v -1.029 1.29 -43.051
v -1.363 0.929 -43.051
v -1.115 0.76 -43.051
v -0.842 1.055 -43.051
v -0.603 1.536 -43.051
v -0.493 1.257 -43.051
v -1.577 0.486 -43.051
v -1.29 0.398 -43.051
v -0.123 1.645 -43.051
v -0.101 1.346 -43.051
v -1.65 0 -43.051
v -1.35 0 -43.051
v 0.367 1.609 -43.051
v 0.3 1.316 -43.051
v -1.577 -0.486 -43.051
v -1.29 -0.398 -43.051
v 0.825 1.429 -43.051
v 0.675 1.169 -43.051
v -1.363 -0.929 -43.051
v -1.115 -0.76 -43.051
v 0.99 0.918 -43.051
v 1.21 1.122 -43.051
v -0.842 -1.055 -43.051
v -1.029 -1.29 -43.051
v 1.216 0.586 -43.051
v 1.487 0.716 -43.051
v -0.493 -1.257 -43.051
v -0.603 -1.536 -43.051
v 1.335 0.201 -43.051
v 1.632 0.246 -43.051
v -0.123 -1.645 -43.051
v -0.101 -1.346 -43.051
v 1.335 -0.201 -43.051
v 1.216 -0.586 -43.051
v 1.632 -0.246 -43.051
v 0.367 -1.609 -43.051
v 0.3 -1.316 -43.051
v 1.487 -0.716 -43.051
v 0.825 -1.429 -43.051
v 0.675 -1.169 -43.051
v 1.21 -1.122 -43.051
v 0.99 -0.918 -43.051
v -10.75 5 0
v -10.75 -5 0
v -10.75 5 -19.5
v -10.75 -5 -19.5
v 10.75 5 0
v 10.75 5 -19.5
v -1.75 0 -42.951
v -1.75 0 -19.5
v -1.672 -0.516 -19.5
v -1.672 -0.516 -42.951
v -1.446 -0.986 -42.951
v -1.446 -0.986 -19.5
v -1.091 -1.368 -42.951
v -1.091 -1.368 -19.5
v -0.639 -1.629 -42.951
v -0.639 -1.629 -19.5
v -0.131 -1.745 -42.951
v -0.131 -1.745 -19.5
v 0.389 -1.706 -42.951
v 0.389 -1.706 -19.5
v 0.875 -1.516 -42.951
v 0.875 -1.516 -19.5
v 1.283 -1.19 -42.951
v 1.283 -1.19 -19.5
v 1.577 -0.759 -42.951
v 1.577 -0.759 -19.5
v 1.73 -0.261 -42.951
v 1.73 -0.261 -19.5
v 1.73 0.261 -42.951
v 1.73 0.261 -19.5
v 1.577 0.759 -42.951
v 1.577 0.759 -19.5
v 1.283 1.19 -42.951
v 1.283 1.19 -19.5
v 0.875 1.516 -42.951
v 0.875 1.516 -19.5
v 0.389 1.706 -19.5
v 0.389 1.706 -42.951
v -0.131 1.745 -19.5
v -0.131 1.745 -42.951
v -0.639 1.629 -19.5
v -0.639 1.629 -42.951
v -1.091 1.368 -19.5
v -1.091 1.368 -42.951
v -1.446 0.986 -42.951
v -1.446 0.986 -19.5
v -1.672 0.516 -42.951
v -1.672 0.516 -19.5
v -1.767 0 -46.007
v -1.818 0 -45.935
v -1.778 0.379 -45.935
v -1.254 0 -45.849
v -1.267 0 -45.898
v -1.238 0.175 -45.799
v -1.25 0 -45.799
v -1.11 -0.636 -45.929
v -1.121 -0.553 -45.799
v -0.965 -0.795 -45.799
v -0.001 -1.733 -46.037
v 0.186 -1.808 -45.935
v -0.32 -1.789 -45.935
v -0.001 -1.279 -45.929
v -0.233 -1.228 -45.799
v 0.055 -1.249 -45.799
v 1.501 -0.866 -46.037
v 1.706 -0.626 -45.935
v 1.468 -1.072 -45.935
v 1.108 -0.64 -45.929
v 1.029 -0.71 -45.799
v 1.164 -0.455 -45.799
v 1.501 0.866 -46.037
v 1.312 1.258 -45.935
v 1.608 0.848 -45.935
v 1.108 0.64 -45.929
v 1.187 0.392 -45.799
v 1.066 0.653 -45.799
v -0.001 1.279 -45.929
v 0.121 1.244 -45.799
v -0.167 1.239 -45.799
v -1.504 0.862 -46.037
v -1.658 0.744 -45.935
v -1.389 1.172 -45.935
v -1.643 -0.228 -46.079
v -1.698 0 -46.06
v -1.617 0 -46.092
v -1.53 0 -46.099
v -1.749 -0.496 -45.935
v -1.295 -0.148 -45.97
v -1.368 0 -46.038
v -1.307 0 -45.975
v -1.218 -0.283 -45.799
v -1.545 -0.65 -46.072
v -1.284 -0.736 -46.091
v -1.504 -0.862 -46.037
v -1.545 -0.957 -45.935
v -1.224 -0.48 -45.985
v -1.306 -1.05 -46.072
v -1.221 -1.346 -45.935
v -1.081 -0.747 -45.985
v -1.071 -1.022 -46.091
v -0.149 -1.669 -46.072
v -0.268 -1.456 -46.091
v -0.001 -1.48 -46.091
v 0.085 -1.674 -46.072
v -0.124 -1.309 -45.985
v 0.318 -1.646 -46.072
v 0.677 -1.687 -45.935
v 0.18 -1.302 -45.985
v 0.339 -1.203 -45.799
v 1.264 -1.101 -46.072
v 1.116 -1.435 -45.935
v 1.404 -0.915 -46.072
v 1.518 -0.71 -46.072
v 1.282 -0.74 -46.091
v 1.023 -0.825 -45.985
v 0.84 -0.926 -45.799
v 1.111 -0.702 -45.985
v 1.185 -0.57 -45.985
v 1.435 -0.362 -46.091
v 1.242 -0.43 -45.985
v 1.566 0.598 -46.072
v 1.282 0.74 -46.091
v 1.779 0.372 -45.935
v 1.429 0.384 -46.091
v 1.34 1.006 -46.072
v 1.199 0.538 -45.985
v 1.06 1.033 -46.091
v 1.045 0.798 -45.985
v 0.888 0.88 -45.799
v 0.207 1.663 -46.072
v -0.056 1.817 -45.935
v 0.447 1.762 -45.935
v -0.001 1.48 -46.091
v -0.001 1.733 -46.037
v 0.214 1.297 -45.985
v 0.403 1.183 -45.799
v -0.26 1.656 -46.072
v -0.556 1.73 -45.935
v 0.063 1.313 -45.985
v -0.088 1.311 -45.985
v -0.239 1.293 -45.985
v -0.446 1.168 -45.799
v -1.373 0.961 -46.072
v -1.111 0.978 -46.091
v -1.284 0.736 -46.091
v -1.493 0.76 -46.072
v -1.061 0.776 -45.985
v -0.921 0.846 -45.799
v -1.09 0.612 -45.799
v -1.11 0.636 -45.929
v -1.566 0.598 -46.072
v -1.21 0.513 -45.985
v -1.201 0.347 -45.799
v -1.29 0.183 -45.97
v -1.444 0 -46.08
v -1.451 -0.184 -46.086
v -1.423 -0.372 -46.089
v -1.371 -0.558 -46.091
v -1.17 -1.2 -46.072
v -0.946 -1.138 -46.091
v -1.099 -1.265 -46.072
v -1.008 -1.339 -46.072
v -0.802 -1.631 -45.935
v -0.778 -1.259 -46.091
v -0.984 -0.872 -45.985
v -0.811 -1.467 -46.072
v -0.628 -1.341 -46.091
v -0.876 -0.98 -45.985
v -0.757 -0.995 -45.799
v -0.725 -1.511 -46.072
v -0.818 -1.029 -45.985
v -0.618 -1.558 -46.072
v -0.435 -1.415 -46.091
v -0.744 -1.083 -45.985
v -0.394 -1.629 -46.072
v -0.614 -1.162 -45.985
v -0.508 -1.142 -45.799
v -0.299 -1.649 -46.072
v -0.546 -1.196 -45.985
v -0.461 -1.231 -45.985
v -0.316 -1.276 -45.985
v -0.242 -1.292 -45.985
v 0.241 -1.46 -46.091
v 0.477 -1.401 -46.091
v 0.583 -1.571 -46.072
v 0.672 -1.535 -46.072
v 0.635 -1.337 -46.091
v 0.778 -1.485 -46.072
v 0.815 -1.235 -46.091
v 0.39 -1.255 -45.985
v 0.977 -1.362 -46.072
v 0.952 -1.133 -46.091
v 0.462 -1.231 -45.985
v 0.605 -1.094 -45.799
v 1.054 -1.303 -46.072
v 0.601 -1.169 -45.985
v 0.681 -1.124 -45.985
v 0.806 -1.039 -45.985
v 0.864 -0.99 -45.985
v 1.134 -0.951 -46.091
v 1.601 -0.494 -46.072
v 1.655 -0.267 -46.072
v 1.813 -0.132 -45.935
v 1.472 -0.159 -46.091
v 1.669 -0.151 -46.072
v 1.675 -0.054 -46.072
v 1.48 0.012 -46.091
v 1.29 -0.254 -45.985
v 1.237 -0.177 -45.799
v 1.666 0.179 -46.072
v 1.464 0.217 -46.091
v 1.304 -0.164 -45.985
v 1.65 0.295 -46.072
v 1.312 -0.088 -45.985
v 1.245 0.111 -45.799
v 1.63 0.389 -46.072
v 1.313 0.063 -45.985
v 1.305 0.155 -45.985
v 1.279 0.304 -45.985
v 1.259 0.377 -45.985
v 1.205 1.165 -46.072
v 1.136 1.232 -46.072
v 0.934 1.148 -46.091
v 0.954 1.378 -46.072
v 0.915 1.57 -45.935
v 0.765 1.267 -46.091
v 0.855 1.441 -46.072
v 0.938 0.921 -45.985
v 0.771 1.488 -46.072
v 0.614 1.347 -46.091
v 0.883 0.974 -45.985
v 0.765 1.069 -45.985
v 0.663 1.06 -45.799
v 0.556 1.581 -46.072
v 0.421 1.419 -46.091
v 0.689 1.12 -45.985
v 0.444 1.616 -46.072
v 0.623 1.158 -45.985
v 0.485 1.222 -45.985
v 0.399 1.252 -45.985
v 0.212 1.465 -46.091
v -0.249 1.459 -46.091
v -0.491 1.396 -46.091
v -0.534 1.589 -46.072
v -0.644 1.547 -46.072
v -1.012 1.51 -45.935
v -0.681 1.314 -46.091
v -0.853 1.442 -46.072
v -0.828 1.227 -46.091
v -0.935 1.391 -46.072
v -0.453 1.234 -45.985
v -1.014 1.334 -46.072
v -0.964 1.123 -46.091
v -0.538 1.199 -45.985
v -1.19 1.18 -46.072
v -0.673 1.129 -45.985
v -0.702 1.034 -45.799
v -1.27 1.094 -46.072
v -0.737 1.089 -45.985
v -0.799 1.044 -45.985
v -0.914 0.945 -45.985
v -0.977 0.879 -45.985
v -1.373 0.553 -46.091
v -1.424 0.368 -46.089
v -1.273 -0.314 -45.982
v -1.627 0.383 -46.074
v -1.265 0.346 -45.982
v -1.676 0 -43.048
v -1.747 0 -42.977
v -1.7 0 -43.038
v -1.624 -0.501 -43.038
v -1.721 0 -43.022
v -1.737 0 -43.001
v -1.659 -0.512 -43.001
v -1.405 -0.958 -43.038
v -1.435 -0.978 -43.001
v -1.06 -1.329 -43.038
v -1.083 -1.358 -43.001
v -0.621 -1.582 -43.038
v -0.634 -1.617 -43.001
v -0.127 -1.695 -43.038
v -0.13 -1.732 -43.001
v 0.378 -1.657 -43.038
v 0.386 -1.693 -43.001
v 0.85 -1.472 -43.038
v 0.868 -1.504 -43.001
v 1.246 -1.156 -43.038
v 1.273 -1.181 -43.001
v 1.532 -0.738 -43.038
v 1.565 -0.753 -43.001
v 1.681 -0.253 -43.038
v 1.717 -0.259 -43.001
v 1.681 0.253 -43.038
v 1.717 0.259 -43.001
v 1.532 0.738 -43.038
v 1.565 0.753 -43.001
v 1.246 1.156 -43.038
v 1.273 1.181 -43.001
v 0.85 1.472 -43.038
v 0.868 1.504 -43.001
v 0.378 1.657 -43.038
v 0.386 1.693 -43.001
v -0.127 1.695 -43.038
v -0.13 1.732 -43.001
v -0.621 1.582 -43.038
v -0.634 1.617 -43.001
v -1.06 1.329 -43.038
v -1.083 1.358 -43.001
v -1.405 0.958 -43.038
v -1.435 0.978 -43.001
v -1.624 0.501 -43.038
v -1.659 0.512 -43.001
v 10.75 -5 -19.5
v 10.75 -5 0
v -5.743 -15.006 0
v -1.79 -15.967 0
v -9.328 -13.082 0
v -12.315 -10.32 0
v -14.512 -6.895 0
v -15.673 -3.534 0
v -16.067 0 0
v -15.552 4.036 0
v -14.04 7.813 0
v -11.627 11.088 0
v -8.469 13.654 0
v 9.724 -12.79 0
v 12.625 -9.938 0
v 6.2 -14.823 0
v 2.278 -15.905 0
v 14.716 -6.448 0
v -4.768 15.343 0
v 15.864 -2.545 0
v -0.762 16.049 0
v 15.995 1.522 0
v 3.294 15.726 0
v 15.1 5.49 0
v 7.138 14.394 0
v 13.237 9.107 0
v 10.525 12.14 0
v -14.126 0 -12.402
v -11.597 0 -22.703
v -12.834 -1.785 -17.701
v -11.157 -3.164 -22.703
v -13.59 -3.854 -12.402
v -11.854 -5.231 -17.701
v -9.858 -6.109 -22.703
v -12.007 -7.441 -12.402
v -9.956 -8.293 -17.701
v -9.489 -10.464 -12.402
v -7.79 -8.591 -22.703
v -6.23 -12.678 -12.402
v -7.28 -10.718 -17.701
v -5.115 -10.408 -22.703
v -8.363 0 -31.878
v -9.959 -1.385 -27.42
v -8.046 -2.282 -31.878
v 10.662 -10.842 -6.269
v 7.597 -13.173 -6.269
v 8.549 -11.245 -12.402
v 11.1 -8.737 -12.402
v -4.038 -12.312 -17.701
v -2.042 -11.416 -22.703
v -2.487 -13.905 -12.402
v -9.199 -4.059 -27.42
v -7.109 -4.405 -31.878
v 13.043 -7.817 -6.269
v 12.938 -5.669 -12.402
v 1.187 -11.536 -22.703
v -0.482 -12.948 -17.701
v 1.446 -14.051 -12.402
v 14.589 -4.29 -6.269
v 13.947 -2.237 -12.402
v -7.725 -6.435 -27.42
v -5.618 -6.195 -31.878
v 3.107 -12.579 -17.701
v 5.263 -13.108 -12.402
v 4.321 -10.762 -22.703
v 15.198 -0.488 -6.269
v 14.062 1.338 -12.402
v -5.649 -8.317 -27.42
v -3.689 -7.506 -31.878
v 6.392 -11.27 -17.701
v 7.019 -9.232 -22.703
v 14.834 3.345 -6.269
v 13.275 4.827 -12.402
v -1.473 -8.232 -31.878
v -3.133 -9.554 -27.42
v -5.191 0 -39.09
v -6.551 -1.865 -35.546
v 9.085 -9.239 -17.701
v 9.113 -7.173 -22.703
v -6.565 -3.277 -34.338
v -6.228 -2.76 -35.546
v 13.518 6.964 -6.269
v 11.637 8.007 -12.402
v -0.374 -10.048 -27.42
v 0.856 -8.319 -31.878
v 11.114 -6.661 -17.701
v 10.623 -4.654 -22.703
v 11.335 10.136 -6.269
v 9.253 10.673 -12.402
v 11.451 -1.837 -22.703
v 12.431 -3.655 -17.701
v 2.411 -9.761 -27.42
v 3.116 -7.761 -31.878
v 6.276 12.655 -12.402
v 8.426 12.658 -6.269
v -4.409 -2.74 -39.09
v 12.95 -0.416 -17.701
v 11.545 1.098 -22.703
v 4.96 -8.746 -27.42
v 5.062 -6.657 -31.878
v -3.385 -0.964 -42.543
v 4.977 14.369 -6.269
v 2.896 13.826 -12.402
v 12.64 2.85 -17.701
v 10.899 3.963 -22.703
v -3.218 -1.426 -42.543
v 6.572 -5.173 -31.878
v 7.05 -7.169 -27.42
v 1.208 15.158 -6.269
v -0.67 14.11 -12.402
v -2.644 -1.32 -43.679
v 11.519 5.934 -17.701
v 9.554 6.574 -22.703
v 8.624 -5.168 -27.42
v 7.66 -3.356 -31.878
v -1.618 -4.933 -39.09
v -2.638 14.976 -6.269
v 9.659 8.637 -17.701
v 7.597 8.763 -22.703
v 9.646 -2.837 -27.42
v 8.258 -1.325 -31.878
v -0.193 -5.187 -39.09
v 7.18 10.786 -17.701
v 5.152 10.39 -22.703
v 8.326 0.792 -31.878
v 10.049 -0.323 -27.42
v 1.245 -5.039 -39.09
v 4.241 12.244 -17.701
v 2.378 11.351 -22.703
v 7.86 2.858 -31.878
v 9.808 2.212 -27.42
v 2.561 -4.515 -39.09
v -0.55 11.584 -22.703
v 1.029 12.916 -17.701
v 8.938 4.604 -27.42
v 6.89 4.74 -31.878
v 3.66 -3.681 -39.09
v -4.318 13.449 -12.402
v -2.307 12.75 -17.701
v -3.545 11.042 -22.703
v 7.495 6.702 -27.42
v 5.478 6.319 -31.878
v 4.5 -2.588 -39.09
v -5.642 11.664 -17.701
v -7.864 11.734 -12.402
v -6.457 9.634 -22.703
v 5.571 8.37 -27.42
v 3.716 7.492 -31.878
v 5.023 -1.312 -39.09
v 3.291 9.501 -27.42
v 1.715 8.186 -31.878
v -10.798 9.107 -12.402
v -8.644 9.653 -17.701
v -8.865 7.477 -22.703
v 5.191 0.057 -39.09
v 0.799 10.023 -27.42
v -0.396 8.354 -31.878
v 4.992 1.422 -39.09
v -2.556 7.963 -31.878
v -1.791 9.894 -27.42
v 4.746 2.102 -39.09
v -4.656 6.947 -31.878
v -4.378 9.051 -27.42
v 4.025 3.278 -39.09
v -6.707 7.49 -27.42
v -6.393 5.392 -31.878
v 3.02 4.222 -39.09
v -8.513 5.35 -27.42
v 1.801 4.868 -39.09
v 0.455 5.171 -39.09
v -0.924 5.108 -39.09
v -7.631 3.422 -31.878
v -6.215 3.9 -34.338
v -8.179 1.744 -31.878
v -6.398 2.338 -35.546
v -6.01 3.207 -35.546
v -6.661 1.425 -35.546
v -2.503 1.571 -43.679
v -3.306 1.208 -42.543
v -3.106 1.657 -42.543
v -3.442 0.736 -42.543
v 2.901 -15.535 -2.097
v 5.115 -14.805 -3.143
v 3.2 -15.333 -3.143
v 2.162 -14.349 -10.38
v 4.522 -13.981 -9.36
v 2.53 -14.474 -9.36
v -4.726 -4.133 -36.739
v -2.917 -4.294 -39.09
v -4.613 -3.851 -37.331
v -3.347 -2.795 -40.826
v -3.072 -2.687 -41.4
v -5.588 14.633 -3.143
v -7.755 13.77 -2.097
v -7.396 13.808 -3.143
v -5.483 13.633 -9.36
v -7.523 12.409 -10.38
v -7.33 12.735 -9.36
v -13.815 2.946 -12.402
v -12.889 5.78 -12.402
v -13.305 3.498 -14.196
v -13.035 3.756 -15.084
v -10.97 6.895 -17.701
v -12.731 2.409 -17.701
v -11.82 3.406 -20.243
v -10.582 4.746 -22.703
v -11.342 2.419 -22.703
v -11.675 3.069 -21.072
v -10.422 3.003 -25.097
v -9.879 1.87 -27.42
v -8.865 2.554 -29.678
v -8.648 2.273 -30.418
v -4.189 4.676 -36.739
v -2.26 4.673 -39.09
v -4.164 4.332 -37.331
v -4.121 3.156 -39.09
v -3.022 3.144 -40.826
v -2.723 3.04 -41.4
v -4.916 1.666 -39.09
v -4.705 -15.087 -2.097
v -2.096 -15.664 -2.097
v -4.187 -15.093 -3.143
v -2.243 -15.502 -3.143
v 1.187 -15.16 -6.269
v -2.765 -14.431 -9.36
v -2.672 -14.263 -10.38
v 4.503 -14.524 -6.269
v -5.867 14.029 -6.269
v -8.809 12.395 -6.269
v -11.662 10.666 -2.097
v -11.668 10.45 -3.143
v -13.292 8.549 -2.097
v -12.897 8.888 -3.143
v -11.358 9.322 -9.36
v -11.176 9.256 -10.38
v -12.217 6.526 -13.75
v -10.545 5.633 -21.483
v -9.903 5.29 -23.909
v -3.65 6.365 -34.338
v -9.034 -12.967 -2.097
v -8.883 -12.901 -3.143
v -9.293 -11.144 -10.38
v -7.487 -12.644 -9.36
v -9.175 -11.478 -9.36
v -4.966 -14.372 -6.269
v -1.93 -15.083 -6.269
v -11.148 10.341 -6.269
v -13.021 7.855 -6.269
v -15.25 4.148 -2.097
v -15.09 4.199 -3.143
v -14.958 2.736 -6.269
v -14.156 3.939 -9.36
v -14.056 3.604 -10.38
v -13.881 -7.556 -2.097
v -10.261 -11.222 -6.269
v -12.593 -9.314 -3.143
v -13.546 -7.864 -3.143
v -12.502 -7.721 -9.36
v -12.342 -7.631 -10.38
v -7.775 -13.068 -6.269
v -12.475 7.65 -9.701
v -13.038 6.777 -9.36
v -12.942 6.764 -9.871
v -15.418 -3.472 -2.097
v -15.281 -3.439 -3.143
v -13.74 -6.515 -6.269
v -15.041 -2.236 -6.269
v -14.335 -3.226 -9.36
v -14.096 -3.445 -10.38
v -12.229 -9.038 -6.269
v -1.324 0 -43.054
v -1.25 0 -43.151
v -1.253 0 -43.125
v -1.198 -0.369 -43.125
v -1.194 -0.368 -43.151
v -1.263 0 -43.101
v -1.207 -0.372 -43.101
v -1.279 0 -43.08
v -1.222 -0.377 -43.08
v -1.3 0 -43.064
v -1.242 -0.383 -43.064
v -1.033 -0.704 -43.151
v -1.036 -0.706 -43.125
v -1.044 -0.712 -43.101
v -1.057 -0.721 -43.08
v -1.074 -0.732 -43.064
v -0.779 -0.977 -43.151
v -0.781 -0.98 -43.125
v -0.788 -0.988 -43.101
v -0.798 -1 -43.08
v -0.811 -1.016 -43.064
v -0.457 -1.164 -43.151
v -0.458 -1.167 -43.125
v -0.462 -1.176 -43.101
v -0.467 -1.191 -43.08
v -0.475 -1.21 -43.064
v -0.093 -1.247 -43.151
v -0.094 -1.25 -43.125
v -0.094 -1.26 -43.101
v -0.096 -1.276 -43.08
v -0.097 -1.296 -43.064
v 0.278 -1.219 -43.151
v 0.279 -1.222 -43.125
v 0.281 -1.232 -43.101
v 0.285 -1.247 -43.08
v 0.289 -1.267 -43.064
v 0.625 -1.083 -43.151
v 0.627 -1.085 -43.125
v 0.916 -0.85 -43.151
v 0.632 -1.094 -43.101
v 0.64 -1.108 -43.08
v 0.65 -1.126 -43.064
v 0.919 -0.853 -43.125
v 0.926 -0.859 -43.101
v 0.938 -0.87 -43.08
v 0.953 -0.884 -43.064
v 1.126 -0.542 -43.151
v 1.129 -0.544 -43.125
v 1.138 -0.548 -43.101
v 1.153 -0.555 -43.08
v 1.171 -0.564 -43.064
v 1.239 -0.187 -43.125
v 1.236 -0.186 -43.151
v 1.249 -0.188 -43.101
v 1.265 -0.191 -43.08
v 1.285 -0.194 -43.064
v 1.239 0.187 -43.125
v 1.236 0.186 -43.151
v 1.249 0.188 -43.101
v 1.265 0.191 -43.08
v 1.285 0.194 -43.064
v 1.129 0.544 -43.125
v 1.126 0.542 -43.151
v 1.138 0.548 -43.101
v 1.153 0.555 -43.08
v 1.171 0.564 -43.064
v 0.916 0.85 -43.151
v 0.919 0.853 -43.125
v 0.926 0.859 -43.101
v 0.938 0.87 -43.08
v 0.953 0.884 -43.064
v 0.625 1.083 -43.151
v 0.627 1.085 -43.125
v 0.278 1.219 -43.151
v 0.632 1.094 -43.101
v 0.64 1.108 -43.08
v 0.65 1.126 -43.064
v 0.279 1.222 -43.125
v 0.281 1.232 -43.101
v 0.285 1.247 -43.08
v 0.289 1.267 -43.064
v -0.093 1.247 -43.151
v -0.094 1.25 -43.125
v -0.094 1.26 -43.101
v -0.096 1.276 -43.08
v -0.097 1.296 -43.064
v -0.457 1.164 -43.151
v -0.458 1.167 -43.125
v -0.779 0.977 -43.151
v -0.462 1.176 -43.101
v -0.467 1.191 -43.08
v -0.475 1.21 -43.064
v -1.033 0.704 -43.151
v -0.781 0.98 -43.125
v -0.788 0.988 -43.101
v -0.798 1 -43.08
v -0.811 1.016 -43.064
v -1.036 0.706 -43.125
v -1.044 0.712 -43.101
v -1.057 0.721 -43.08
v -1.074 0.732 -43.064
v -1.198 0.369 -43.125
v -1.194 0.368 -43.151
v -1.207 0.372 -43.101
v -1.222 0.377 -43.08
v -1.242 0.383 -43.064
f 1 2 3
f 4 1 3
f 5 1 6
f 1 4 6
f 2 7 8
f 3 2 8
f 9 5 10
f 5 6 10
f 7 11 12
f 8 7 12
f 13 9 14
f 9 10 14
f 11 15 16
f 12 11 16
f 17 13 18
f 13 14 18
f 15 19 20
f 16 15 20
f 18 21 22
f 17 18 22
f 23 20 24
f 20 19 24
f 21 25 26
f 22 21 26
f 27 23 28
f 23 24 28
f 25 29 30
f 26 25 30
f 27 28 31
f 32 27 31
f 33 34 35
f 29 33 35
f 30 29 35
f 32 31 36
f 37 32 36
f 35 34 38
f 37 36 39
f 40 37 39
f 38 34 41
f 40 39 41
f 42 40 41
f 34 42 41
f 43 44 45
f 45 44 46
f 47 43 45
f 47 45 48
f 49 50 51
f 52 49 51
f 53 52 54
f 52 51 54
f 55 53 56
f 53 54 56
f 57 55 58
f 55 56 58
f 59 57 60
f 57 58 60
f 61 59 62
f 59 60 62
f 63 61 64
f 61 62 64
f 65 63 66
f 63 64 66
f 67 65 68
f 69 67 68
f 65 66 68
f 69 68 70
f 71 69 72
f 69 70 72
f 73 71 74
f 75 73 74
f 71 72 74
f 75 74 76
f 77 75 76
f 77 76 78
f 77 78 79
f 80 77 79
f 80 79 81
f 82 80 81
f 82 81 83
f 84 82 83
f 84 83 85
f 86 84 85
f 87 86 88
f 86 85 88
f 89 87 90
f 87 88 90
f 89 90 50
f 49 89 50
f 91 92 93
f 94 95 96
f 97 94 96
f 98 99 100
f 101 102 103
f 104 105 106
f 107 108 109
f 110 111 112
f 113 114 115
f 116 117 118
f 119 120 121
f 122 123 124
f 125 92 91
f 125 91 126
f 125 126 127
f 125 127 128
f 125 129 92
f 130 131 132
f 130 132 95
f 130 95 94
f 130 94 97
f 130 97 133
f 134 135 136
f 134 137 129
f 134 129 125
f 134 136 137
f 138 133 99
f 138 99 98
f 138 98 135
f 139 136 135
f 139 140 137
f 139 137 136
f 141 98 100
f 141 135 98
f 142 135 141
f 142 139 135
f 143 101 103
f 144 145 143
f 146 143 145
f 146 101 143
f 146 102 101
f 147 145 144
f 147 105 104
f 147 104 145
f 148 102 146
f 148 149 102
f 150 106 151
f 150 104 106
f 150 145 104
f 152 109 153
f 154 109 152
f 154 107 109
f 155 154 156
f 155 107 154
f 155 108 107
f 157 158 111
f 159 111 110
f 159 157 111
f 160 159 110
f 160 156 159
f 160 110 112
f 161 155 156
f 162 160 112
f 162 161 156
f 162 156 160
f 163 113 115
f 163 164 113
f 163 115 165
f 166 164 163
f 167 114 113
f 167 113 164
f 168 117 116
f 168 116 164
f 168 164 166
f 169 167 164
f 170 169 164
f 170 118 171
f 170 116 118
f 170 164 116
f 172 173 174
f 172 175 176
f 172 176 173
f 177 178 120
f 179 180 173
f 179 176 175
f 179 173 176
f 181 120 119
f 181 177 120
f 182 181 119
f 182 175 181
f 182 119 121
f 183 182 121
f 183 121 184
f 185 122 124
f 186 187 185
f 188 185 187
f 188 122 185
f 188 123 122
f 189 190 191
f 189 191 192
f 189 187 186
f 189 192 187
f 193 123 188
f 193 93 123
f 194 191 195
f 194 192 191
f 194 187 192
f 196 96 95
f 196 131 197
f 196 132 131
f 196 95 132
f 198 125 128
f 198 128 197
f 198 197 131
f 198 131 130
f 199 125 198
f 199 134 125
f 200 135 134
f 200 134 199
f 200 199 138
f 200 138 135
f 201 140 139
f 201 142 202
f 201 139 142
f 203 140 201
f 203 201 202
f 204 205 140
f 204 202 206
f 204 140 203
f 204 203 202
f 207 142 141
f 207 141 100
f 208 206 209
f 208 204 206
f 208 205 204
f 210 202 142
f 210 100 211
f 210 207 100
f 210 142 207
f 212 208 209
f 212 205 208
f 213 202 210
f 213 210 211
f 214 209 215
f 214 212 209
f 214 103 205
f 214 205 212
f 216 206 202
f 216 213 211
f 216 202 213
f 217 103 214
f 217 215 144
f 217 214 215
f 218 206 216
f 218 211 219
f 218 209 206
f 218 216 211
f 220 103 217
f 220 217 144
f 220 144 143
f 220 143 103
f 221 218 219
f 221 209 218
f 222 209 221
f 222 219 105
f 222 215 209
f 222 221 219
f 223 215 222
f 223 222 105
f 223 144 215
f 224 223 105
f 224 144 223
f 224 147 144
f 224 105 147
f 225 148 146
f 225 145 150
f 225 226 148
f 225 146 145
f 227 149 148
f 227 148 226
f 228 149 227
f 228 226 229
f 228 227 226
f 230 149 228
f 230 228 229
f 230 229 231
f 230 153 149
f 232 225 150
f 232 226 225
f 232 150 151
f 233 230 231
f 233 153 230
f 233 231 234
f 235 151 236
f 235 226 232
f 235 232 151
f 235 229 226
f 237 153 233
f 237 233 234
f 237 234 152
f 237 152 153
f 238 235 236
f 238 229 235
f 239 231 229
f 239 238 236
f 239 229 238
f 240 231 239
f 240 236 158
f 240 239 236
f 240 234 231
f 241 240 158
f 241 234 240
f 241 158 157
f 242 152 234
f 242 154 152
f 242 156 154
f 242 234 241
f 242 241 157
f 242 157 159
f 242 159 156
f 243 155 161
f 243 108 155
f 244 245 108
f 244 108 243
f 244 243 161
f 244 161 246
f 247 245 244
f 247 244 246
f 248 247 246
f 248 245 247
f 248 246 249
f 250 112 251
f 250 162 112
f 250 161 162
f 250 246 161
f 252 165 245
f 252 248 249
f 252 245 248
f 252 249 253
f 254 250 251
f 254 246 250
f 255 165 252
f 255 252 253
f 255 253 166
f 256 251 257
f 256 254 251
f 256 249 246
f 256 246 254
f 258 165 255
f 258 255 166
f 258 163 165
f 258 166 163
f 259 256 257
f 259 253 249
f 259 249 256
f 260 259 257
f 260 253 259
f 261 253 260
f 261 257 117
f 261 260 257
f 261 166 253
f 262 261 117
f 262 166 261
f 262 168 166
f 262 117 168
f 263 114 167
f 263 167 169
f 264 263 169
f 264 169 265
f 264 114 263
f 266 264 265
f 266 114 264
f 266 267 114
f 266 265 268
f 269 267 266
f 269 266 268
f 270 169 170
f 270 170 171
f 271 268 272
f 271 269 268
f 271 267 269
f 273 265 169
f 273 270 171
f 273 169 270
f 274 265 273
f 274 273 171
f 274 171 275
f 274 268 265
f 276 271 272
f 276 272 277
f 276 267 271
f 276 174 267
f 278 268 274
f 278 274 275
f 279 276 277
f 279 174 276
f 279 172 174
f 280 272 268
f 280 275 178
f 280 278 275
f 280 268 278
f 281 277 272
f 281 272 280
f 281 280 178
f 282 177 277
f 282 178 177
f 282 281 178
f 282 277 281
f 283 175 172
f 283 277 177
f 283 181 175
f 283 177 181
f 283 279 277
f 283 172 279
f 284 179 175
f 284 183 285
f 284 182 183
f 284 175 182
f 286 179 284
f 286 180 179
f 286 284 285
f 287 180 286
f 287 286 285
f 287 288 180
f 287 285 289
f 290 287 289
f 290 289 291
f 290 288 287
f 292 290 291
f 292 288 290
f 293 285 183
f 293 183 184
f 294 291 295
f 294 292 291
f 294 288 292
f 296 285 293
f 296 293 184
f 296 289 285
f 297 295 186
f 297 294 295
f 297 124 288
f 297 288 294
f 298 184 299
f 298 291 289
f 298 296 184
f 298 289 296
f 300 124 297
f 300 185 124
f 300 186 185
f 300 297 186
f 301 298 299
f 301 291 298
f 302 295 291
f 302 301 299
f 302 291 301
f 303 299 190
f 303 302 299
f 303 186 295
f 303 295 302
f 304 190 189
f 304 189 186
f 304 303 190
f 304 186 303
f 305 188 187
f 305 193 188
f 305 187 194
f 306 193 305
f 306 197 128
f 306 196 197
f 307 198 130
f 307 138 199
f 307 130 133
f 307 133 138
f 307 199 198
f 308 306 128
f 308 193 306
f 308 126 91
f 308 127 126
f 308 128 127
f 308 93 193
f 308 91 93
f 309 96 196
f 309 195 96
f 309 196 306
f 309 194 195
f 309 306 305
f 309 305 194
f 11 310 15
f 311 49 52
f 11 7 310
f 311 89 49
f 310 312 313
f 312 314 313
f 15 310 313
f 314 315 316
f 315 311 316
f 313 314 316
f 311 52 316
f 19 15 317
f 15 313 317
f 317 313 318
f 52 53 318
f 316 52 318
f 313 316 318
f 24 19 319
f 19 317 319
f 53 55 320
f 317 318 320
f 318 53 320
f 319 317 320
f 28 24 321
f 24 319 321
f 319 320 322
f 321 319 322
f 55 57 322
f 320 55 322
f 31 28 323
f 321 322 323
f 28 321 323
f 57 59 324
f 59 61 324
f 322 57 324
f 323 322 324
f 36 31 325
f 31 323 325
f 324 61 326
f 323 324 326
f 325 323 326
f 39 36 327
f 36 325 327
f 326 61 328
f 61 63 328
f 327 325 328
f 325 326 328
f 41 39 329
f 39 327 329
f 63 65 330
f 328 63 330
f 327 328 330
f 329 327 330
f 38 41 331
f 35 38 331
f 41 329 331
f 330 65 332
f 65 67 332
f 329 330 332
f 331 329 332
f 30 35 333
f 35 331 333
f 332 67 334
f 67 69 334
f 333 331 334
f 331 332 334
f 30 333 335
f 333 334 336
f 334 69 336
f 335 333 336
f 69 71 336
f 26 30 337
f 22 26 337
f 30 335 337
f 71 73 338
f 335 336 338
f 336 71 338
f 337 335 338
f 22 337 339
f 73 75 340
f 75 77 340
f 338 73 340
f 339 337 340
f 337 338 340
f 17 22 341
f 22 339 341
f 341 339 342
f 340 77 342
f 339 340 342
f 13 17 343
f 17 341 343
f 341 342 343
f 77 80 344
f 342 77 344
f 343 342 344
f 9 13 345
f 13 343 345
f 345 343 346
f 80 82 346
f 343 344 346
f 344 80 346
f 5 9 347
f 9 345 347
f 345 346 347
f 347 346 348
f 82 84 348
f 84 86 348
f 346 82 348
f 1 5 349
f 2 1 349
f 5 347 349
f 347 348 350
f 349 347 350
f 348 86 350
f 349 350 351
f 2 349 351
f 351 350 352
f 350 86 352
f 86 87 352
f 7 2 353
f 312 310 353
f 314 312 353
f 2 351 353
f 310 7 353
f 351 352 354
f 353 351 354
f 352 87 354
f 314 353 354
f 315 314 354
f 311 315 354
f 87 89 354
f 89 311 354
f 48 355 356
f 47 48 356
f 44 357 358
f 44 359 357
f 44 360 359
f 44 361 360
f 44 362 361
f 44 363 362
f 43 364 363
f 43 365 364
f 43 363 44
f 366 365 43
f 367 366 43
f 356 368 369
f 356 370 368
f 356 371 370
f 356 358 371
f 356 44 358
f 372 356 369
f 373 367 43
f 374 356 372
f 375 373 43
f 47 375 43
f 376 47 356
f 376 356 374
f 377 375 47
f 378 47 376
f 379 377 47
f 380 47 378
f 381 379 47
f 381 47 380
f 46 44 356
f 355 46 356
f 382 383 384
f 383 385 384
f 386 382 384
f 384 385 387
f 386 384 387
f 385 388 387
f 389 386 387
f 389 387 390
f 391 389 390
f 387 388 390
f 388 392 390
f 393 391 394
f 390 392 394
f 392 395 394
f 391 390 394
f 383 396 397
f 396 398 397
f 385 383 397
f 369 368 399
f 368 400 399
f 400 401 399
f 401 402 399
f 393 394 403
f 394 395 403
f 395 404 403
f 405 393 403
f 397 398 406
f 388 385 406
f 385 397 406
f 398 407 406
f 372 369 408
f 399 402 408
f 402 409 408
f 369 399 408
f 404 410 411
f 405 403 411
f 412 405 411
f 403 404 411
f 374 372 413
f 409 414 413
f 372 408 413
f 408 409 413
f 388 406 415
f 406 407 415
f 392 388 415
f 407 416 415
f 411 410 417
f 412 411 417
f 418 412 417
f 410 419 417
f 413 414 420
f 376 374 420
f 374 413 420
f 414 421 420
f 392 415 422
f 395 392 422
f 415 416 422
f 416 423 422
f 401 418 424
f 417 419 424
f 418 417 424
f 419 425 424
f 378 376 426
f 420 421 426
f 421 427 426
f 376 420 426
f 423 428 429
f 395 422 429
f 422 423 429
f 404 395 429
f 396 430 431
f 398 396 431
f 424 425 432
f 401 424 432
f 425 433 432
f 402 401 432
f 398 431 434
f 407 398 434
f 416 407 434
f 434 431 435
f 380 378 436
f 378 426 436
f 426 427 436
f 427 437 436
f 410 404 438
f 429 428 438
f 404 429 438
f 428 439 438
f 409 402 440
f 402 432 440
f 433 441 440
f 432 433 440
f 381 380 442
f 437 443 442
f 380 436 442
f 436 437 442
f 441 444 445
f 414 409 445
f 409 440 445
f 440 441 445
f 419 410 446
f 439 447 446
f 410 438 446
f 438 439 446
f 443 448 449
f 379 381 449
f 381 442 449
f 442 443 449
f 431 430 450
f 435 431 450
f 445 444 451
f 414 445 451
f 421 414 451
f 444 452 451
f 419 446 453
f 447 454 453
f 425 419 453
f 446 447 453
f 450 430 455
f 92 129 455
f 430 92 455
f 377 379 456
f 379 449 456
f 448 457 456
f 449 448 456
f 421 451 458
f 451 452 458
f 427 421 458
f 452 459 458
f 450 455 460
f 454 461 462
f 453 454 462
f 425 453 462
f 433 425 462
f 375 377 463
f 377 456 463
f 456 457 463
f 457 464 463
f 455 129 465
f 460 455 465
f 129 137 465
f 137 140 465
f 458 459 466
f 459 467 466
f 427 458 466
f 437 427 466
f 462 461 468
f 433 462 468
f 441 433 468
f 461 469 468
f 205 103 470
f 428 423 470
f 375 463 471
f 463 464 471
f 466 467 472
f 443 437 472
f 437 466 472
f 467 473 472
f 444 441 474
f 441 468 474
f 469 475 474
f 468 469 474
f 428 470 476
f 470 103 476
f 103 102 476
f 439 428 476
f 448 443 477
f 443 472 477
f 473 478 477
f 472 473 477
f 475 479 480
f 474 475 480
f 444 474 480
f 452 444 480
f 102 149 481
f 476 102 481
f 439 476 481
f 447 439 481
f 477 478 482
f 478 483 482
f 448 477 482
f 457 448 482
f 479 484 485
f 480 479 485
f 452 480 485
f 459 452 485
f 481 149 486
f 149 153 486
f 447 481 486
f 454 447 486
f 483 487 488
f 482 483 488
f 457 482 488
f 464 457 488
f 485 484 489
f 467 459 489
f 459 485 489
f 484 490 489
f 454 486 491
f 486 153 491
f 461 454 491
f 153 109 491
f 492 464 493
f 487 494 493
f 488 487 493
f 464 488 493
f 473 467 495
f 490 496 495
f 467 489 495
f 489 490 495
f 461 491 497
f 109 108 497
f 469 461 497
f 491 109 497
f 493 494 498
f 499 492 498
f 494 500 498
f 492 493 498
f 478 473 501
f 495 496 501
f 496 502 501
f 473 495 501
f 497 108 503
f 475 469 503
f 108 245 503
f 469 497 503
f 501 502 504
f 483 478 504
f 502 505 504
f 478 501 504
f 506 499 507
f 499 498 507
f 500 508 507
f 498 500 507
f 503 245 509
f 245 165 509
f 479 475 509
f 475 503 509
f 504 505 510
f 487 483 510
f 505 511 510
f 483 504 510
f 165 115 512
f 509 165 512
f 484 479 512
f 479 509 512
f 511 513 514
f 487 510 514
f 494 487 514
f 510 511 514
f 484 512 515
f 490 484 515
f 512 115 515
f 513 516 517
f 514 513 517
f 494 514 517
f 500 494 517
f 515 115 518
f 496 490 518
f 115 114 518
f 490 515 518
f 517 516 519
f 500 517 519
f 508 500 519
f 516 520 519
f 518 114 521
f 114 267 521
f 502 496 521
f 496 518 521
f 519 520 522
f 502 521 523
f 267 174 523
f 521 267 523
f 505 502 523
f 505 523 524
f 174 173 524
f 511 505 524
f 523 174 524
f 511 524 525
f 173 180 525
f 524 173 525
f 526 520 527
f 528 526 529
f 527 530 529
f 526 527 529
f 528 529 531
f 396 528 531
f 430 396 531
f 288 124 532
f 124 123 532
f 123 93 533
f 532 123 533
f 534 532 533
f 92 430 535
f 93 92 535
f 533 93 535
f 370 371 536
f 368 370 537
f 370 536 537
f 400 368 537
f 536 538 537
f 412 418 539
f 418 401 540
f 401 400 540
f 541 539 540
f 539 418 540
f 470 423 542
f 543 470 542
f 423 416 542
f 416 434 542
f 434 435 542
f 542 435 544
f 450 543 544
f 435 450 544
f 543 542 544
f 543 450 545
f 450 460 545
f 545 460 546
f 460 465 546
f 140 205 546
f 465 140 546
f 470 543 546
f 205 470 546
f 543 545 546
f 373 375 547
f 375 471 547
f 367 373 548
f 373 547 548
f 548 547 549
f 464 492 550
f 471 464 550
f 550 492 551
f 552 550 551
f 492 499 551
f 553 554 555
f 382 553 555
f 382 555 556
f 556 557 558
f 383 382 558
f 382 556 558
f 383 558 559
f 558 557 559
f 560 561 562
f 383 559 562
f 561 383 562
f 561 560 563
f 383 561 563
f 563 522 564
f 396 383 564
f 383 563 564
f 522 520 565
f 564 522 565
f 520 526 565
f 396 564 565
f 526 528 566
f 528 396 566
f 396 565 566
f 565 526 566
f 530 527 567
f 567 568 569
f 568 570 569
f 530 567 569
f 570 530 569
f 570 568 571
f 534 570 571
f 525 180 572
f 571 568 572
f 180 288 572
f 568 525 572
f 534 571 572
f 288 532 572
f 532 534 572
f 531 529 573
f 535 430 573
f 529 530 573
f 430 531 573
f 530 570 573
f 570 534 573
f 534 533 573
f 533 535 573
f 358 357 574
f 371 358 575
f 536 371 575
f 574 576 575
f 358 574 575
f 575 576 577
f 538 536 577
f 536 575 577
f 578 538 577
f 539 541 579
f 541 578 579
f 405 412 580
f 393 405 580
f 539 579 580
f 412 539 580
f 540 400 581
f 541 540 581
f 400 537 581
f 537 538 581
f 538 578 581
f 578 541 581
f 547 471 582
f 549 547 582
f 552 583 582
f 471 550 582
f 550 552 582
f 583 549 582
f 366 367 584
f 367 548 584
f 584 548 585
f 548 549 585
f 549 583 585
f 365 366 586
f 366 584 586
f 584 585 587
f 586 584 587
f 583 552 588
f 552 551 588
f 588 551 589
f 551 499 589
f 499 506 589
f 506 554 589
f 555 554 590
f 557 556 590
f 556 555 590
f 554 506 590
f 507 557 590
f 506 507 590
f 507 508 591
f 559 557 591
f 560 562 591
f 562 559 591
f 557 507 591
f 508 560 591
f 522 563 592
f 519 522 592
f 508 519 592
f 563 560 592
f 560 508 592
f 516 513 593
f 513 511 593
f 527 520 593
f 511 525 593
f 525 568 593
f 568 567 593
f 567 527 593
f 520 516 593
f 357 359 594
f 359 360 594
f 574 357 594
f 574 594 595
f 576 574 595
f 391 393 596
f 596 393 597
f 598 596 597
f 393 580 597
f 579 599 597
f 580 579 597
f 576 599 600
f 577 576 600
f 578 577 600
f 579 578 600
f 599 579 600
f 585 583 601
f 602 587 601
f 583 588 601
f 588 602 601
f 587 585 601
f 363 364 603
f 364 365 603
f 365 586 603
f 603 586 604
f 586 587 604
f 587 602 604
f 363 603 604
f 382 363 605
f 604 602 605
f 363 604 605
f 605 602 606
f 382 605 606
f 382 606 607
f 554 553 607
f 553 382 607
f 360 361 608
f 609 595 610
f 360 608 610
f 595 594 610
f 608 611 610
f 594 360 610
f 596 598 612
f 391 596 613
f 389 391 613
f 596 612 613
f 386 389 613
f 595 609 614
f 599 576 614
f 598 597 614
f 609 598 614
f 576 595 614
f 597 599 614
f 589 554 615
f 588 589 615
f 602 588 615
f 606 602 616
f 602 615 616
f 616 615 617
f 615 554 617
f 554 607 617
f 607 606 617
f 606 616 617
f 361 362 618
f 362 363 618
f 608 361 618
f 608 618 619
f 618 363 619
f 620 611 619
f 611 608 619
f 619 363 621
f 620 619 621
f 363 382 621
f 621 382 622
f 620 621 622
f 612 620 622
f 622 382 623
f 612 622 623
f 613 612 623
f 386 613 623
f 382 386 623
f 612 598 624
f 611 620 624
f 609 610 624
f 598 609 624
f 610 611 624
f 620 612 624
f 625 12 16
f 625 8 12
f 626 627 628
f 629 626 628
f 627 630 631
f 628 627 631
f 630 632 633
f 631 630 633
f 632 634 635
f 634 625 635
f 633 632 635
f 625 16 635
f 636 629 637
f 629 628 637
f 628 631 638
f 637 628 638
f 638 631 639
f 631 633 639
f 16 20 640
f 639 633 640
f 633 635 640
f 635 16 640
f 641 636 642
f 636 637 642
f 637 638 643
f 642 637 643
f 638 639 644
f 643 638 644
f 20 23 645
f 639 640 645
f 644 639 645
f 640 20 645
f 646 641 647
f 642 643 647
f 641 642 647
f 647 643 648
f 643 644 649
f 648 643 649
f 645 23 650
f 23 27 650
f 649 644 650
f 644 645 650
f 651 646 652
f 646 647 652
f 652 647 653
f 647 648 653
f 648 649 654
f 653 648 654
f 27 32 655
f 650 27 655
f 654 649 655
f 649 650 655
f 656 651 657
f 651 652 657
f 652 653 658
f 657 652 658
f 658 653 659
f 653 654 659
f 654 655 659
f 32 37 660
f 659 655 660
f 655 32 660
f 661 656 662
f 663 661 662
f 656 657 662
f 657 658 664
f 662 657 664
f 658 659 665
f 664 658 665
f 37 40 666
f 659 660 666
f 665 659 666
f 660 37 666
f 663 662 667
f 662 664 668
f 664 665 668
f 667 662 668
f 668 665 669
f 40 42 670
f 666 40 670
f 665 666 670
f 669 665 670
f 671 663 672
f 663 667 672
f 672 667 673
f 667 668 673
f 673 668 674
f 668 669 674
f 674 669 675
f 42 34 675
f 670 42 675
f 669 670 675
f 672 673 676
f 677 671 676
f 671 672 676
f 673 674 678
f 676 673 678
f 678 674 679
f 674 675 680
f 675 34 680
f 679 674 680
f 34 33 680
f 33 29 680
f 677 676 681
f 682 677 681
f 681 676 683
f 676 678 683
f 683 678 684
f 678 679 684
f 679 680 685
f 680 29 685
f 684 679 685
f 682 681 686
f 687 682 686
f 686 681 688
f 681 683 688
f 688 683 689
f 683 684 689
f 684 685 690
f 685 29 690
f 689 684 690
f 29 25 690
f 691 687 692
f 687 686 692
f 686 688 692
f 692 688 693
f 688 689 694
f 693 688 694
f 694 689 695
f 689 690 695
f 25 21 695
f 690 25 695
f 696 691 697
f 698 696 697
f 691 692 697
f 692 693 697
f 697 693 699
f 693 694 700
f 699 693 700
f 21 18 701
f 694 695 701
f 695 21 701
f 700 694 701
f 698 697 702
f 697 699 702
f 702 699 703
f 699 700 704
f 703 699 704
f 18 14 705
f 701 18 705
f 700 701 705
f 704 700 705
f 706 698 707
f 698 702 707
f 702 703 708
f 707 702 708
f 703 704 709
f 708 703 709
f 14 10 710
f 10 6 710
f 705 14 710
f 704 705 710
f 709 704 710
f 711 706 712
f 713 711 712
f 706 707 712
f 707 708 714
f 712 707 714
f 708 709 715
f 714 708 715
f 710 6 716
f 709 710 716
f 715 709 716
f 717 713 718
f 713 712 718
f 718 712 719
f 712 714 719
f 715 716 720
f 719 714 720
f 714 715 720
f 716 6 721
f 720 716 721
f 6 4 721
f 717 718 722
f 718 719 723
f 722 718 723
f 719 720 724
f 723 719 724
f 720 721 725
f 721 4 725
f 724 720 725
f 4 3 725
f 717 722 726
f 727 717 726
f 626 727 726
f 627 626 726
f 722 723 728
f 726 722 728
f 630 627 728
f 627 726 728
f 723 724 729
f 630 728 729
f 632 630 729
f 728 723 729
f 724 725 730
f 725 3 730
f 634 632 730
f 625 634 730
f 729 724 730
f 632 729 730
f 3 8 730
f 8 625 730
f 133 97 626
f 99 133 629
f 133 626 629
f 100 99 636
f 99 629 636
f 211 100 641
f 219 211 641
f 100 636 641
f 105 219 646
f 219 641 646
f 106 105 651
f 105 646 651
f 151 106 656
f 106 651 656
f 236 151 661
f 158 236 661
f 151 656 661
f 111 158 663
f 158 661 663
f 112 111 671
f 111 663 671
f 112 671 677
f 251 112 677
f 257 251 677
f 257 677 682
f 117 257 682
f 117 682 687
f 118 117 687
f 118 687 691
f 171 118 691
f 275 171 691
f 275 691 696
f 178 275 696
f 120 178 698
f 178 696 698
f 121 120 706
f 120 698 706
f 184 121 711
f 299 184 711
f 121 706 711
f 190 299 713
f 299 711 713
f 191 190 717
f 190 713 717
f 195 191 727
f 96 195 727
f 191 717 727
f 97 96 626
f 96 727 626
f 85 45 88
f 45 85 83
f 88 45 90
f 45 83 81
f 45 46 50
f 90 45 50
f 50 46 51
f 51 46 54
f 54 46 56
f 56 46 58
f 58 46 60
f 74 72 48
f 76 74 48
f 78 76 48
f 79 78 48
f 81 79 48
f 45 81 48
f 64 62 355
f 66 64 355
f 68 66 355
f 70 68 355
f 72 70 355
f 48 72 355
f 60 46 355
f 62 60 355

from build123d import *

# Parameters (mm, degrees)
F3_DEPTH  = 5
F5_DEPTH  = 15
F6_W      = 2
F6_H      = 3
F7_DEPTH  = 20.5
F8_W      = 3
F8_H      = 1
F9_DEPTH  = 17.5068136575
F10_R     = 0.3
F11_R     = 0.1
F12_R     = 0.1
F13_W     = 100
F13_H     = 100
F14_DEPTH = 62.0010001


with BuildPart() as f2:
    # F1 (on Front) → F2 (revolve)
    with BuildSketch(Plane.XZ):
        with BuildLine():
            Line((-2, 62), (-10, 62))
            add(Edge.make_bspline(
                [(-10, 62), (-11.8174263966, 57.1809415466), (-15.8594861297, 46.4373198499), (-18.6273544316, 24.5459471202), (-15.0414654734, -19.3469968059), (-5.4834802074, -38.7438846901), (-1.25, -47.0509425635)],
                knots=[0, 0, 0, 0, 0.1886807773, 0.4119593541, 0.7294893705, 0.9757699691, 0.9757699691, 0.9757699691, 0.9757699691], degree=3))
            Line((-1.25, -47.0509425635), (-1.25, -43.0509425635))
            Line((-1.25, -43.0509425635), (-1.75, -43.0509425635))
            Line((-1.75, -43.0509425635), (-1.75, -19.5))
            Line((-1.75, -19.5), (0, -19.5))
            Line((0, -19.5), (0, 47))
            Line((0, 47), (0, 50))
            Line((0, 50), (-2, 50))
            Line((-2, 50), (-2, 62))
        make_face()
    revolve(axis=Axis((0, 0, 54.5), (0, 0, 1)))

    # F0 (on Front) → F3 (cut, symmetric)
    with BuildSketch(Plane.XZ):
        Polygon((-10.75, -19.5), (10.75, -19.5), (10.75, 44.5), (9, 44.5), (9, 50.5), (-9, 50.5), (-9, 44.5), (-10.75, 44.5), align=None)
    extrude(amount=F3_DEPTH, both=True, mode=Mode.SUBTRACT)

    # F4 (on face) → F5 (cut)
    with BuildSketch(Plane.XY.offset(62)):
        Polygon((1.2421649551, -1.9468845774), (2.3071339798, 0.1023041181), (1.0649690247, 2.0491886955), (-1.2421649551, 1.9468845774), (-2.3071339798, -0.1023041181), (-1.0649690247, -2.0491886955), align=None)
    extrude(amount=-F5_DEPTH, mode=Mode.SUBTRACT)

    # F6 (on Right) → F7 (cut, symmetric)
    with BuildSketch(Plane.YZ):
        with Locations((-0.8976958819, 48.5)):
            Rectangle(F6_W, F6_H)
    extrude(amount=F7_DEPTH, both=True, mode=Mode.SUBTRACT)

    # F8 (on Front) → F9 (cut, through all)
    with BuildSketch(Plane.XZ):
        with Locations((0, 41.5)):
            Rectangle(F8_W, F8_H)
    extrude(amount=F9_DEPTH, mode=Mode.SUBTRACT)

    # F10
    f10_edges = [f2.edges().sort_by_distance(p)[0] for p in [
        (1.25, 0, -47.050943),
    ]]
    fillet(f10_edges, radius=F10_R)

    # F11
    f11_edges = [f2.edges().sort_by_distance(p)[0] for p in [
        (1.25, 0, -43.050943),
    ]]
    fillet(f11_edges, radius=F11_R)

    # F12
    f12_edges = [f2.edges().sort_by_distance(p)[0] for p in [
        (1.75, 0, -43.050943),
    ]]
    fillet(f12_edges, radius=F12_R)

    # F13 (on Top) → F14 (cut, through all)
    with BuildSketch(Plane.XY):
        Rectangle(F13_W, F13_H)
    extrude(amount=F14_DEPTH, mode=Mode.SUBTRACT)


solid = f2.part
